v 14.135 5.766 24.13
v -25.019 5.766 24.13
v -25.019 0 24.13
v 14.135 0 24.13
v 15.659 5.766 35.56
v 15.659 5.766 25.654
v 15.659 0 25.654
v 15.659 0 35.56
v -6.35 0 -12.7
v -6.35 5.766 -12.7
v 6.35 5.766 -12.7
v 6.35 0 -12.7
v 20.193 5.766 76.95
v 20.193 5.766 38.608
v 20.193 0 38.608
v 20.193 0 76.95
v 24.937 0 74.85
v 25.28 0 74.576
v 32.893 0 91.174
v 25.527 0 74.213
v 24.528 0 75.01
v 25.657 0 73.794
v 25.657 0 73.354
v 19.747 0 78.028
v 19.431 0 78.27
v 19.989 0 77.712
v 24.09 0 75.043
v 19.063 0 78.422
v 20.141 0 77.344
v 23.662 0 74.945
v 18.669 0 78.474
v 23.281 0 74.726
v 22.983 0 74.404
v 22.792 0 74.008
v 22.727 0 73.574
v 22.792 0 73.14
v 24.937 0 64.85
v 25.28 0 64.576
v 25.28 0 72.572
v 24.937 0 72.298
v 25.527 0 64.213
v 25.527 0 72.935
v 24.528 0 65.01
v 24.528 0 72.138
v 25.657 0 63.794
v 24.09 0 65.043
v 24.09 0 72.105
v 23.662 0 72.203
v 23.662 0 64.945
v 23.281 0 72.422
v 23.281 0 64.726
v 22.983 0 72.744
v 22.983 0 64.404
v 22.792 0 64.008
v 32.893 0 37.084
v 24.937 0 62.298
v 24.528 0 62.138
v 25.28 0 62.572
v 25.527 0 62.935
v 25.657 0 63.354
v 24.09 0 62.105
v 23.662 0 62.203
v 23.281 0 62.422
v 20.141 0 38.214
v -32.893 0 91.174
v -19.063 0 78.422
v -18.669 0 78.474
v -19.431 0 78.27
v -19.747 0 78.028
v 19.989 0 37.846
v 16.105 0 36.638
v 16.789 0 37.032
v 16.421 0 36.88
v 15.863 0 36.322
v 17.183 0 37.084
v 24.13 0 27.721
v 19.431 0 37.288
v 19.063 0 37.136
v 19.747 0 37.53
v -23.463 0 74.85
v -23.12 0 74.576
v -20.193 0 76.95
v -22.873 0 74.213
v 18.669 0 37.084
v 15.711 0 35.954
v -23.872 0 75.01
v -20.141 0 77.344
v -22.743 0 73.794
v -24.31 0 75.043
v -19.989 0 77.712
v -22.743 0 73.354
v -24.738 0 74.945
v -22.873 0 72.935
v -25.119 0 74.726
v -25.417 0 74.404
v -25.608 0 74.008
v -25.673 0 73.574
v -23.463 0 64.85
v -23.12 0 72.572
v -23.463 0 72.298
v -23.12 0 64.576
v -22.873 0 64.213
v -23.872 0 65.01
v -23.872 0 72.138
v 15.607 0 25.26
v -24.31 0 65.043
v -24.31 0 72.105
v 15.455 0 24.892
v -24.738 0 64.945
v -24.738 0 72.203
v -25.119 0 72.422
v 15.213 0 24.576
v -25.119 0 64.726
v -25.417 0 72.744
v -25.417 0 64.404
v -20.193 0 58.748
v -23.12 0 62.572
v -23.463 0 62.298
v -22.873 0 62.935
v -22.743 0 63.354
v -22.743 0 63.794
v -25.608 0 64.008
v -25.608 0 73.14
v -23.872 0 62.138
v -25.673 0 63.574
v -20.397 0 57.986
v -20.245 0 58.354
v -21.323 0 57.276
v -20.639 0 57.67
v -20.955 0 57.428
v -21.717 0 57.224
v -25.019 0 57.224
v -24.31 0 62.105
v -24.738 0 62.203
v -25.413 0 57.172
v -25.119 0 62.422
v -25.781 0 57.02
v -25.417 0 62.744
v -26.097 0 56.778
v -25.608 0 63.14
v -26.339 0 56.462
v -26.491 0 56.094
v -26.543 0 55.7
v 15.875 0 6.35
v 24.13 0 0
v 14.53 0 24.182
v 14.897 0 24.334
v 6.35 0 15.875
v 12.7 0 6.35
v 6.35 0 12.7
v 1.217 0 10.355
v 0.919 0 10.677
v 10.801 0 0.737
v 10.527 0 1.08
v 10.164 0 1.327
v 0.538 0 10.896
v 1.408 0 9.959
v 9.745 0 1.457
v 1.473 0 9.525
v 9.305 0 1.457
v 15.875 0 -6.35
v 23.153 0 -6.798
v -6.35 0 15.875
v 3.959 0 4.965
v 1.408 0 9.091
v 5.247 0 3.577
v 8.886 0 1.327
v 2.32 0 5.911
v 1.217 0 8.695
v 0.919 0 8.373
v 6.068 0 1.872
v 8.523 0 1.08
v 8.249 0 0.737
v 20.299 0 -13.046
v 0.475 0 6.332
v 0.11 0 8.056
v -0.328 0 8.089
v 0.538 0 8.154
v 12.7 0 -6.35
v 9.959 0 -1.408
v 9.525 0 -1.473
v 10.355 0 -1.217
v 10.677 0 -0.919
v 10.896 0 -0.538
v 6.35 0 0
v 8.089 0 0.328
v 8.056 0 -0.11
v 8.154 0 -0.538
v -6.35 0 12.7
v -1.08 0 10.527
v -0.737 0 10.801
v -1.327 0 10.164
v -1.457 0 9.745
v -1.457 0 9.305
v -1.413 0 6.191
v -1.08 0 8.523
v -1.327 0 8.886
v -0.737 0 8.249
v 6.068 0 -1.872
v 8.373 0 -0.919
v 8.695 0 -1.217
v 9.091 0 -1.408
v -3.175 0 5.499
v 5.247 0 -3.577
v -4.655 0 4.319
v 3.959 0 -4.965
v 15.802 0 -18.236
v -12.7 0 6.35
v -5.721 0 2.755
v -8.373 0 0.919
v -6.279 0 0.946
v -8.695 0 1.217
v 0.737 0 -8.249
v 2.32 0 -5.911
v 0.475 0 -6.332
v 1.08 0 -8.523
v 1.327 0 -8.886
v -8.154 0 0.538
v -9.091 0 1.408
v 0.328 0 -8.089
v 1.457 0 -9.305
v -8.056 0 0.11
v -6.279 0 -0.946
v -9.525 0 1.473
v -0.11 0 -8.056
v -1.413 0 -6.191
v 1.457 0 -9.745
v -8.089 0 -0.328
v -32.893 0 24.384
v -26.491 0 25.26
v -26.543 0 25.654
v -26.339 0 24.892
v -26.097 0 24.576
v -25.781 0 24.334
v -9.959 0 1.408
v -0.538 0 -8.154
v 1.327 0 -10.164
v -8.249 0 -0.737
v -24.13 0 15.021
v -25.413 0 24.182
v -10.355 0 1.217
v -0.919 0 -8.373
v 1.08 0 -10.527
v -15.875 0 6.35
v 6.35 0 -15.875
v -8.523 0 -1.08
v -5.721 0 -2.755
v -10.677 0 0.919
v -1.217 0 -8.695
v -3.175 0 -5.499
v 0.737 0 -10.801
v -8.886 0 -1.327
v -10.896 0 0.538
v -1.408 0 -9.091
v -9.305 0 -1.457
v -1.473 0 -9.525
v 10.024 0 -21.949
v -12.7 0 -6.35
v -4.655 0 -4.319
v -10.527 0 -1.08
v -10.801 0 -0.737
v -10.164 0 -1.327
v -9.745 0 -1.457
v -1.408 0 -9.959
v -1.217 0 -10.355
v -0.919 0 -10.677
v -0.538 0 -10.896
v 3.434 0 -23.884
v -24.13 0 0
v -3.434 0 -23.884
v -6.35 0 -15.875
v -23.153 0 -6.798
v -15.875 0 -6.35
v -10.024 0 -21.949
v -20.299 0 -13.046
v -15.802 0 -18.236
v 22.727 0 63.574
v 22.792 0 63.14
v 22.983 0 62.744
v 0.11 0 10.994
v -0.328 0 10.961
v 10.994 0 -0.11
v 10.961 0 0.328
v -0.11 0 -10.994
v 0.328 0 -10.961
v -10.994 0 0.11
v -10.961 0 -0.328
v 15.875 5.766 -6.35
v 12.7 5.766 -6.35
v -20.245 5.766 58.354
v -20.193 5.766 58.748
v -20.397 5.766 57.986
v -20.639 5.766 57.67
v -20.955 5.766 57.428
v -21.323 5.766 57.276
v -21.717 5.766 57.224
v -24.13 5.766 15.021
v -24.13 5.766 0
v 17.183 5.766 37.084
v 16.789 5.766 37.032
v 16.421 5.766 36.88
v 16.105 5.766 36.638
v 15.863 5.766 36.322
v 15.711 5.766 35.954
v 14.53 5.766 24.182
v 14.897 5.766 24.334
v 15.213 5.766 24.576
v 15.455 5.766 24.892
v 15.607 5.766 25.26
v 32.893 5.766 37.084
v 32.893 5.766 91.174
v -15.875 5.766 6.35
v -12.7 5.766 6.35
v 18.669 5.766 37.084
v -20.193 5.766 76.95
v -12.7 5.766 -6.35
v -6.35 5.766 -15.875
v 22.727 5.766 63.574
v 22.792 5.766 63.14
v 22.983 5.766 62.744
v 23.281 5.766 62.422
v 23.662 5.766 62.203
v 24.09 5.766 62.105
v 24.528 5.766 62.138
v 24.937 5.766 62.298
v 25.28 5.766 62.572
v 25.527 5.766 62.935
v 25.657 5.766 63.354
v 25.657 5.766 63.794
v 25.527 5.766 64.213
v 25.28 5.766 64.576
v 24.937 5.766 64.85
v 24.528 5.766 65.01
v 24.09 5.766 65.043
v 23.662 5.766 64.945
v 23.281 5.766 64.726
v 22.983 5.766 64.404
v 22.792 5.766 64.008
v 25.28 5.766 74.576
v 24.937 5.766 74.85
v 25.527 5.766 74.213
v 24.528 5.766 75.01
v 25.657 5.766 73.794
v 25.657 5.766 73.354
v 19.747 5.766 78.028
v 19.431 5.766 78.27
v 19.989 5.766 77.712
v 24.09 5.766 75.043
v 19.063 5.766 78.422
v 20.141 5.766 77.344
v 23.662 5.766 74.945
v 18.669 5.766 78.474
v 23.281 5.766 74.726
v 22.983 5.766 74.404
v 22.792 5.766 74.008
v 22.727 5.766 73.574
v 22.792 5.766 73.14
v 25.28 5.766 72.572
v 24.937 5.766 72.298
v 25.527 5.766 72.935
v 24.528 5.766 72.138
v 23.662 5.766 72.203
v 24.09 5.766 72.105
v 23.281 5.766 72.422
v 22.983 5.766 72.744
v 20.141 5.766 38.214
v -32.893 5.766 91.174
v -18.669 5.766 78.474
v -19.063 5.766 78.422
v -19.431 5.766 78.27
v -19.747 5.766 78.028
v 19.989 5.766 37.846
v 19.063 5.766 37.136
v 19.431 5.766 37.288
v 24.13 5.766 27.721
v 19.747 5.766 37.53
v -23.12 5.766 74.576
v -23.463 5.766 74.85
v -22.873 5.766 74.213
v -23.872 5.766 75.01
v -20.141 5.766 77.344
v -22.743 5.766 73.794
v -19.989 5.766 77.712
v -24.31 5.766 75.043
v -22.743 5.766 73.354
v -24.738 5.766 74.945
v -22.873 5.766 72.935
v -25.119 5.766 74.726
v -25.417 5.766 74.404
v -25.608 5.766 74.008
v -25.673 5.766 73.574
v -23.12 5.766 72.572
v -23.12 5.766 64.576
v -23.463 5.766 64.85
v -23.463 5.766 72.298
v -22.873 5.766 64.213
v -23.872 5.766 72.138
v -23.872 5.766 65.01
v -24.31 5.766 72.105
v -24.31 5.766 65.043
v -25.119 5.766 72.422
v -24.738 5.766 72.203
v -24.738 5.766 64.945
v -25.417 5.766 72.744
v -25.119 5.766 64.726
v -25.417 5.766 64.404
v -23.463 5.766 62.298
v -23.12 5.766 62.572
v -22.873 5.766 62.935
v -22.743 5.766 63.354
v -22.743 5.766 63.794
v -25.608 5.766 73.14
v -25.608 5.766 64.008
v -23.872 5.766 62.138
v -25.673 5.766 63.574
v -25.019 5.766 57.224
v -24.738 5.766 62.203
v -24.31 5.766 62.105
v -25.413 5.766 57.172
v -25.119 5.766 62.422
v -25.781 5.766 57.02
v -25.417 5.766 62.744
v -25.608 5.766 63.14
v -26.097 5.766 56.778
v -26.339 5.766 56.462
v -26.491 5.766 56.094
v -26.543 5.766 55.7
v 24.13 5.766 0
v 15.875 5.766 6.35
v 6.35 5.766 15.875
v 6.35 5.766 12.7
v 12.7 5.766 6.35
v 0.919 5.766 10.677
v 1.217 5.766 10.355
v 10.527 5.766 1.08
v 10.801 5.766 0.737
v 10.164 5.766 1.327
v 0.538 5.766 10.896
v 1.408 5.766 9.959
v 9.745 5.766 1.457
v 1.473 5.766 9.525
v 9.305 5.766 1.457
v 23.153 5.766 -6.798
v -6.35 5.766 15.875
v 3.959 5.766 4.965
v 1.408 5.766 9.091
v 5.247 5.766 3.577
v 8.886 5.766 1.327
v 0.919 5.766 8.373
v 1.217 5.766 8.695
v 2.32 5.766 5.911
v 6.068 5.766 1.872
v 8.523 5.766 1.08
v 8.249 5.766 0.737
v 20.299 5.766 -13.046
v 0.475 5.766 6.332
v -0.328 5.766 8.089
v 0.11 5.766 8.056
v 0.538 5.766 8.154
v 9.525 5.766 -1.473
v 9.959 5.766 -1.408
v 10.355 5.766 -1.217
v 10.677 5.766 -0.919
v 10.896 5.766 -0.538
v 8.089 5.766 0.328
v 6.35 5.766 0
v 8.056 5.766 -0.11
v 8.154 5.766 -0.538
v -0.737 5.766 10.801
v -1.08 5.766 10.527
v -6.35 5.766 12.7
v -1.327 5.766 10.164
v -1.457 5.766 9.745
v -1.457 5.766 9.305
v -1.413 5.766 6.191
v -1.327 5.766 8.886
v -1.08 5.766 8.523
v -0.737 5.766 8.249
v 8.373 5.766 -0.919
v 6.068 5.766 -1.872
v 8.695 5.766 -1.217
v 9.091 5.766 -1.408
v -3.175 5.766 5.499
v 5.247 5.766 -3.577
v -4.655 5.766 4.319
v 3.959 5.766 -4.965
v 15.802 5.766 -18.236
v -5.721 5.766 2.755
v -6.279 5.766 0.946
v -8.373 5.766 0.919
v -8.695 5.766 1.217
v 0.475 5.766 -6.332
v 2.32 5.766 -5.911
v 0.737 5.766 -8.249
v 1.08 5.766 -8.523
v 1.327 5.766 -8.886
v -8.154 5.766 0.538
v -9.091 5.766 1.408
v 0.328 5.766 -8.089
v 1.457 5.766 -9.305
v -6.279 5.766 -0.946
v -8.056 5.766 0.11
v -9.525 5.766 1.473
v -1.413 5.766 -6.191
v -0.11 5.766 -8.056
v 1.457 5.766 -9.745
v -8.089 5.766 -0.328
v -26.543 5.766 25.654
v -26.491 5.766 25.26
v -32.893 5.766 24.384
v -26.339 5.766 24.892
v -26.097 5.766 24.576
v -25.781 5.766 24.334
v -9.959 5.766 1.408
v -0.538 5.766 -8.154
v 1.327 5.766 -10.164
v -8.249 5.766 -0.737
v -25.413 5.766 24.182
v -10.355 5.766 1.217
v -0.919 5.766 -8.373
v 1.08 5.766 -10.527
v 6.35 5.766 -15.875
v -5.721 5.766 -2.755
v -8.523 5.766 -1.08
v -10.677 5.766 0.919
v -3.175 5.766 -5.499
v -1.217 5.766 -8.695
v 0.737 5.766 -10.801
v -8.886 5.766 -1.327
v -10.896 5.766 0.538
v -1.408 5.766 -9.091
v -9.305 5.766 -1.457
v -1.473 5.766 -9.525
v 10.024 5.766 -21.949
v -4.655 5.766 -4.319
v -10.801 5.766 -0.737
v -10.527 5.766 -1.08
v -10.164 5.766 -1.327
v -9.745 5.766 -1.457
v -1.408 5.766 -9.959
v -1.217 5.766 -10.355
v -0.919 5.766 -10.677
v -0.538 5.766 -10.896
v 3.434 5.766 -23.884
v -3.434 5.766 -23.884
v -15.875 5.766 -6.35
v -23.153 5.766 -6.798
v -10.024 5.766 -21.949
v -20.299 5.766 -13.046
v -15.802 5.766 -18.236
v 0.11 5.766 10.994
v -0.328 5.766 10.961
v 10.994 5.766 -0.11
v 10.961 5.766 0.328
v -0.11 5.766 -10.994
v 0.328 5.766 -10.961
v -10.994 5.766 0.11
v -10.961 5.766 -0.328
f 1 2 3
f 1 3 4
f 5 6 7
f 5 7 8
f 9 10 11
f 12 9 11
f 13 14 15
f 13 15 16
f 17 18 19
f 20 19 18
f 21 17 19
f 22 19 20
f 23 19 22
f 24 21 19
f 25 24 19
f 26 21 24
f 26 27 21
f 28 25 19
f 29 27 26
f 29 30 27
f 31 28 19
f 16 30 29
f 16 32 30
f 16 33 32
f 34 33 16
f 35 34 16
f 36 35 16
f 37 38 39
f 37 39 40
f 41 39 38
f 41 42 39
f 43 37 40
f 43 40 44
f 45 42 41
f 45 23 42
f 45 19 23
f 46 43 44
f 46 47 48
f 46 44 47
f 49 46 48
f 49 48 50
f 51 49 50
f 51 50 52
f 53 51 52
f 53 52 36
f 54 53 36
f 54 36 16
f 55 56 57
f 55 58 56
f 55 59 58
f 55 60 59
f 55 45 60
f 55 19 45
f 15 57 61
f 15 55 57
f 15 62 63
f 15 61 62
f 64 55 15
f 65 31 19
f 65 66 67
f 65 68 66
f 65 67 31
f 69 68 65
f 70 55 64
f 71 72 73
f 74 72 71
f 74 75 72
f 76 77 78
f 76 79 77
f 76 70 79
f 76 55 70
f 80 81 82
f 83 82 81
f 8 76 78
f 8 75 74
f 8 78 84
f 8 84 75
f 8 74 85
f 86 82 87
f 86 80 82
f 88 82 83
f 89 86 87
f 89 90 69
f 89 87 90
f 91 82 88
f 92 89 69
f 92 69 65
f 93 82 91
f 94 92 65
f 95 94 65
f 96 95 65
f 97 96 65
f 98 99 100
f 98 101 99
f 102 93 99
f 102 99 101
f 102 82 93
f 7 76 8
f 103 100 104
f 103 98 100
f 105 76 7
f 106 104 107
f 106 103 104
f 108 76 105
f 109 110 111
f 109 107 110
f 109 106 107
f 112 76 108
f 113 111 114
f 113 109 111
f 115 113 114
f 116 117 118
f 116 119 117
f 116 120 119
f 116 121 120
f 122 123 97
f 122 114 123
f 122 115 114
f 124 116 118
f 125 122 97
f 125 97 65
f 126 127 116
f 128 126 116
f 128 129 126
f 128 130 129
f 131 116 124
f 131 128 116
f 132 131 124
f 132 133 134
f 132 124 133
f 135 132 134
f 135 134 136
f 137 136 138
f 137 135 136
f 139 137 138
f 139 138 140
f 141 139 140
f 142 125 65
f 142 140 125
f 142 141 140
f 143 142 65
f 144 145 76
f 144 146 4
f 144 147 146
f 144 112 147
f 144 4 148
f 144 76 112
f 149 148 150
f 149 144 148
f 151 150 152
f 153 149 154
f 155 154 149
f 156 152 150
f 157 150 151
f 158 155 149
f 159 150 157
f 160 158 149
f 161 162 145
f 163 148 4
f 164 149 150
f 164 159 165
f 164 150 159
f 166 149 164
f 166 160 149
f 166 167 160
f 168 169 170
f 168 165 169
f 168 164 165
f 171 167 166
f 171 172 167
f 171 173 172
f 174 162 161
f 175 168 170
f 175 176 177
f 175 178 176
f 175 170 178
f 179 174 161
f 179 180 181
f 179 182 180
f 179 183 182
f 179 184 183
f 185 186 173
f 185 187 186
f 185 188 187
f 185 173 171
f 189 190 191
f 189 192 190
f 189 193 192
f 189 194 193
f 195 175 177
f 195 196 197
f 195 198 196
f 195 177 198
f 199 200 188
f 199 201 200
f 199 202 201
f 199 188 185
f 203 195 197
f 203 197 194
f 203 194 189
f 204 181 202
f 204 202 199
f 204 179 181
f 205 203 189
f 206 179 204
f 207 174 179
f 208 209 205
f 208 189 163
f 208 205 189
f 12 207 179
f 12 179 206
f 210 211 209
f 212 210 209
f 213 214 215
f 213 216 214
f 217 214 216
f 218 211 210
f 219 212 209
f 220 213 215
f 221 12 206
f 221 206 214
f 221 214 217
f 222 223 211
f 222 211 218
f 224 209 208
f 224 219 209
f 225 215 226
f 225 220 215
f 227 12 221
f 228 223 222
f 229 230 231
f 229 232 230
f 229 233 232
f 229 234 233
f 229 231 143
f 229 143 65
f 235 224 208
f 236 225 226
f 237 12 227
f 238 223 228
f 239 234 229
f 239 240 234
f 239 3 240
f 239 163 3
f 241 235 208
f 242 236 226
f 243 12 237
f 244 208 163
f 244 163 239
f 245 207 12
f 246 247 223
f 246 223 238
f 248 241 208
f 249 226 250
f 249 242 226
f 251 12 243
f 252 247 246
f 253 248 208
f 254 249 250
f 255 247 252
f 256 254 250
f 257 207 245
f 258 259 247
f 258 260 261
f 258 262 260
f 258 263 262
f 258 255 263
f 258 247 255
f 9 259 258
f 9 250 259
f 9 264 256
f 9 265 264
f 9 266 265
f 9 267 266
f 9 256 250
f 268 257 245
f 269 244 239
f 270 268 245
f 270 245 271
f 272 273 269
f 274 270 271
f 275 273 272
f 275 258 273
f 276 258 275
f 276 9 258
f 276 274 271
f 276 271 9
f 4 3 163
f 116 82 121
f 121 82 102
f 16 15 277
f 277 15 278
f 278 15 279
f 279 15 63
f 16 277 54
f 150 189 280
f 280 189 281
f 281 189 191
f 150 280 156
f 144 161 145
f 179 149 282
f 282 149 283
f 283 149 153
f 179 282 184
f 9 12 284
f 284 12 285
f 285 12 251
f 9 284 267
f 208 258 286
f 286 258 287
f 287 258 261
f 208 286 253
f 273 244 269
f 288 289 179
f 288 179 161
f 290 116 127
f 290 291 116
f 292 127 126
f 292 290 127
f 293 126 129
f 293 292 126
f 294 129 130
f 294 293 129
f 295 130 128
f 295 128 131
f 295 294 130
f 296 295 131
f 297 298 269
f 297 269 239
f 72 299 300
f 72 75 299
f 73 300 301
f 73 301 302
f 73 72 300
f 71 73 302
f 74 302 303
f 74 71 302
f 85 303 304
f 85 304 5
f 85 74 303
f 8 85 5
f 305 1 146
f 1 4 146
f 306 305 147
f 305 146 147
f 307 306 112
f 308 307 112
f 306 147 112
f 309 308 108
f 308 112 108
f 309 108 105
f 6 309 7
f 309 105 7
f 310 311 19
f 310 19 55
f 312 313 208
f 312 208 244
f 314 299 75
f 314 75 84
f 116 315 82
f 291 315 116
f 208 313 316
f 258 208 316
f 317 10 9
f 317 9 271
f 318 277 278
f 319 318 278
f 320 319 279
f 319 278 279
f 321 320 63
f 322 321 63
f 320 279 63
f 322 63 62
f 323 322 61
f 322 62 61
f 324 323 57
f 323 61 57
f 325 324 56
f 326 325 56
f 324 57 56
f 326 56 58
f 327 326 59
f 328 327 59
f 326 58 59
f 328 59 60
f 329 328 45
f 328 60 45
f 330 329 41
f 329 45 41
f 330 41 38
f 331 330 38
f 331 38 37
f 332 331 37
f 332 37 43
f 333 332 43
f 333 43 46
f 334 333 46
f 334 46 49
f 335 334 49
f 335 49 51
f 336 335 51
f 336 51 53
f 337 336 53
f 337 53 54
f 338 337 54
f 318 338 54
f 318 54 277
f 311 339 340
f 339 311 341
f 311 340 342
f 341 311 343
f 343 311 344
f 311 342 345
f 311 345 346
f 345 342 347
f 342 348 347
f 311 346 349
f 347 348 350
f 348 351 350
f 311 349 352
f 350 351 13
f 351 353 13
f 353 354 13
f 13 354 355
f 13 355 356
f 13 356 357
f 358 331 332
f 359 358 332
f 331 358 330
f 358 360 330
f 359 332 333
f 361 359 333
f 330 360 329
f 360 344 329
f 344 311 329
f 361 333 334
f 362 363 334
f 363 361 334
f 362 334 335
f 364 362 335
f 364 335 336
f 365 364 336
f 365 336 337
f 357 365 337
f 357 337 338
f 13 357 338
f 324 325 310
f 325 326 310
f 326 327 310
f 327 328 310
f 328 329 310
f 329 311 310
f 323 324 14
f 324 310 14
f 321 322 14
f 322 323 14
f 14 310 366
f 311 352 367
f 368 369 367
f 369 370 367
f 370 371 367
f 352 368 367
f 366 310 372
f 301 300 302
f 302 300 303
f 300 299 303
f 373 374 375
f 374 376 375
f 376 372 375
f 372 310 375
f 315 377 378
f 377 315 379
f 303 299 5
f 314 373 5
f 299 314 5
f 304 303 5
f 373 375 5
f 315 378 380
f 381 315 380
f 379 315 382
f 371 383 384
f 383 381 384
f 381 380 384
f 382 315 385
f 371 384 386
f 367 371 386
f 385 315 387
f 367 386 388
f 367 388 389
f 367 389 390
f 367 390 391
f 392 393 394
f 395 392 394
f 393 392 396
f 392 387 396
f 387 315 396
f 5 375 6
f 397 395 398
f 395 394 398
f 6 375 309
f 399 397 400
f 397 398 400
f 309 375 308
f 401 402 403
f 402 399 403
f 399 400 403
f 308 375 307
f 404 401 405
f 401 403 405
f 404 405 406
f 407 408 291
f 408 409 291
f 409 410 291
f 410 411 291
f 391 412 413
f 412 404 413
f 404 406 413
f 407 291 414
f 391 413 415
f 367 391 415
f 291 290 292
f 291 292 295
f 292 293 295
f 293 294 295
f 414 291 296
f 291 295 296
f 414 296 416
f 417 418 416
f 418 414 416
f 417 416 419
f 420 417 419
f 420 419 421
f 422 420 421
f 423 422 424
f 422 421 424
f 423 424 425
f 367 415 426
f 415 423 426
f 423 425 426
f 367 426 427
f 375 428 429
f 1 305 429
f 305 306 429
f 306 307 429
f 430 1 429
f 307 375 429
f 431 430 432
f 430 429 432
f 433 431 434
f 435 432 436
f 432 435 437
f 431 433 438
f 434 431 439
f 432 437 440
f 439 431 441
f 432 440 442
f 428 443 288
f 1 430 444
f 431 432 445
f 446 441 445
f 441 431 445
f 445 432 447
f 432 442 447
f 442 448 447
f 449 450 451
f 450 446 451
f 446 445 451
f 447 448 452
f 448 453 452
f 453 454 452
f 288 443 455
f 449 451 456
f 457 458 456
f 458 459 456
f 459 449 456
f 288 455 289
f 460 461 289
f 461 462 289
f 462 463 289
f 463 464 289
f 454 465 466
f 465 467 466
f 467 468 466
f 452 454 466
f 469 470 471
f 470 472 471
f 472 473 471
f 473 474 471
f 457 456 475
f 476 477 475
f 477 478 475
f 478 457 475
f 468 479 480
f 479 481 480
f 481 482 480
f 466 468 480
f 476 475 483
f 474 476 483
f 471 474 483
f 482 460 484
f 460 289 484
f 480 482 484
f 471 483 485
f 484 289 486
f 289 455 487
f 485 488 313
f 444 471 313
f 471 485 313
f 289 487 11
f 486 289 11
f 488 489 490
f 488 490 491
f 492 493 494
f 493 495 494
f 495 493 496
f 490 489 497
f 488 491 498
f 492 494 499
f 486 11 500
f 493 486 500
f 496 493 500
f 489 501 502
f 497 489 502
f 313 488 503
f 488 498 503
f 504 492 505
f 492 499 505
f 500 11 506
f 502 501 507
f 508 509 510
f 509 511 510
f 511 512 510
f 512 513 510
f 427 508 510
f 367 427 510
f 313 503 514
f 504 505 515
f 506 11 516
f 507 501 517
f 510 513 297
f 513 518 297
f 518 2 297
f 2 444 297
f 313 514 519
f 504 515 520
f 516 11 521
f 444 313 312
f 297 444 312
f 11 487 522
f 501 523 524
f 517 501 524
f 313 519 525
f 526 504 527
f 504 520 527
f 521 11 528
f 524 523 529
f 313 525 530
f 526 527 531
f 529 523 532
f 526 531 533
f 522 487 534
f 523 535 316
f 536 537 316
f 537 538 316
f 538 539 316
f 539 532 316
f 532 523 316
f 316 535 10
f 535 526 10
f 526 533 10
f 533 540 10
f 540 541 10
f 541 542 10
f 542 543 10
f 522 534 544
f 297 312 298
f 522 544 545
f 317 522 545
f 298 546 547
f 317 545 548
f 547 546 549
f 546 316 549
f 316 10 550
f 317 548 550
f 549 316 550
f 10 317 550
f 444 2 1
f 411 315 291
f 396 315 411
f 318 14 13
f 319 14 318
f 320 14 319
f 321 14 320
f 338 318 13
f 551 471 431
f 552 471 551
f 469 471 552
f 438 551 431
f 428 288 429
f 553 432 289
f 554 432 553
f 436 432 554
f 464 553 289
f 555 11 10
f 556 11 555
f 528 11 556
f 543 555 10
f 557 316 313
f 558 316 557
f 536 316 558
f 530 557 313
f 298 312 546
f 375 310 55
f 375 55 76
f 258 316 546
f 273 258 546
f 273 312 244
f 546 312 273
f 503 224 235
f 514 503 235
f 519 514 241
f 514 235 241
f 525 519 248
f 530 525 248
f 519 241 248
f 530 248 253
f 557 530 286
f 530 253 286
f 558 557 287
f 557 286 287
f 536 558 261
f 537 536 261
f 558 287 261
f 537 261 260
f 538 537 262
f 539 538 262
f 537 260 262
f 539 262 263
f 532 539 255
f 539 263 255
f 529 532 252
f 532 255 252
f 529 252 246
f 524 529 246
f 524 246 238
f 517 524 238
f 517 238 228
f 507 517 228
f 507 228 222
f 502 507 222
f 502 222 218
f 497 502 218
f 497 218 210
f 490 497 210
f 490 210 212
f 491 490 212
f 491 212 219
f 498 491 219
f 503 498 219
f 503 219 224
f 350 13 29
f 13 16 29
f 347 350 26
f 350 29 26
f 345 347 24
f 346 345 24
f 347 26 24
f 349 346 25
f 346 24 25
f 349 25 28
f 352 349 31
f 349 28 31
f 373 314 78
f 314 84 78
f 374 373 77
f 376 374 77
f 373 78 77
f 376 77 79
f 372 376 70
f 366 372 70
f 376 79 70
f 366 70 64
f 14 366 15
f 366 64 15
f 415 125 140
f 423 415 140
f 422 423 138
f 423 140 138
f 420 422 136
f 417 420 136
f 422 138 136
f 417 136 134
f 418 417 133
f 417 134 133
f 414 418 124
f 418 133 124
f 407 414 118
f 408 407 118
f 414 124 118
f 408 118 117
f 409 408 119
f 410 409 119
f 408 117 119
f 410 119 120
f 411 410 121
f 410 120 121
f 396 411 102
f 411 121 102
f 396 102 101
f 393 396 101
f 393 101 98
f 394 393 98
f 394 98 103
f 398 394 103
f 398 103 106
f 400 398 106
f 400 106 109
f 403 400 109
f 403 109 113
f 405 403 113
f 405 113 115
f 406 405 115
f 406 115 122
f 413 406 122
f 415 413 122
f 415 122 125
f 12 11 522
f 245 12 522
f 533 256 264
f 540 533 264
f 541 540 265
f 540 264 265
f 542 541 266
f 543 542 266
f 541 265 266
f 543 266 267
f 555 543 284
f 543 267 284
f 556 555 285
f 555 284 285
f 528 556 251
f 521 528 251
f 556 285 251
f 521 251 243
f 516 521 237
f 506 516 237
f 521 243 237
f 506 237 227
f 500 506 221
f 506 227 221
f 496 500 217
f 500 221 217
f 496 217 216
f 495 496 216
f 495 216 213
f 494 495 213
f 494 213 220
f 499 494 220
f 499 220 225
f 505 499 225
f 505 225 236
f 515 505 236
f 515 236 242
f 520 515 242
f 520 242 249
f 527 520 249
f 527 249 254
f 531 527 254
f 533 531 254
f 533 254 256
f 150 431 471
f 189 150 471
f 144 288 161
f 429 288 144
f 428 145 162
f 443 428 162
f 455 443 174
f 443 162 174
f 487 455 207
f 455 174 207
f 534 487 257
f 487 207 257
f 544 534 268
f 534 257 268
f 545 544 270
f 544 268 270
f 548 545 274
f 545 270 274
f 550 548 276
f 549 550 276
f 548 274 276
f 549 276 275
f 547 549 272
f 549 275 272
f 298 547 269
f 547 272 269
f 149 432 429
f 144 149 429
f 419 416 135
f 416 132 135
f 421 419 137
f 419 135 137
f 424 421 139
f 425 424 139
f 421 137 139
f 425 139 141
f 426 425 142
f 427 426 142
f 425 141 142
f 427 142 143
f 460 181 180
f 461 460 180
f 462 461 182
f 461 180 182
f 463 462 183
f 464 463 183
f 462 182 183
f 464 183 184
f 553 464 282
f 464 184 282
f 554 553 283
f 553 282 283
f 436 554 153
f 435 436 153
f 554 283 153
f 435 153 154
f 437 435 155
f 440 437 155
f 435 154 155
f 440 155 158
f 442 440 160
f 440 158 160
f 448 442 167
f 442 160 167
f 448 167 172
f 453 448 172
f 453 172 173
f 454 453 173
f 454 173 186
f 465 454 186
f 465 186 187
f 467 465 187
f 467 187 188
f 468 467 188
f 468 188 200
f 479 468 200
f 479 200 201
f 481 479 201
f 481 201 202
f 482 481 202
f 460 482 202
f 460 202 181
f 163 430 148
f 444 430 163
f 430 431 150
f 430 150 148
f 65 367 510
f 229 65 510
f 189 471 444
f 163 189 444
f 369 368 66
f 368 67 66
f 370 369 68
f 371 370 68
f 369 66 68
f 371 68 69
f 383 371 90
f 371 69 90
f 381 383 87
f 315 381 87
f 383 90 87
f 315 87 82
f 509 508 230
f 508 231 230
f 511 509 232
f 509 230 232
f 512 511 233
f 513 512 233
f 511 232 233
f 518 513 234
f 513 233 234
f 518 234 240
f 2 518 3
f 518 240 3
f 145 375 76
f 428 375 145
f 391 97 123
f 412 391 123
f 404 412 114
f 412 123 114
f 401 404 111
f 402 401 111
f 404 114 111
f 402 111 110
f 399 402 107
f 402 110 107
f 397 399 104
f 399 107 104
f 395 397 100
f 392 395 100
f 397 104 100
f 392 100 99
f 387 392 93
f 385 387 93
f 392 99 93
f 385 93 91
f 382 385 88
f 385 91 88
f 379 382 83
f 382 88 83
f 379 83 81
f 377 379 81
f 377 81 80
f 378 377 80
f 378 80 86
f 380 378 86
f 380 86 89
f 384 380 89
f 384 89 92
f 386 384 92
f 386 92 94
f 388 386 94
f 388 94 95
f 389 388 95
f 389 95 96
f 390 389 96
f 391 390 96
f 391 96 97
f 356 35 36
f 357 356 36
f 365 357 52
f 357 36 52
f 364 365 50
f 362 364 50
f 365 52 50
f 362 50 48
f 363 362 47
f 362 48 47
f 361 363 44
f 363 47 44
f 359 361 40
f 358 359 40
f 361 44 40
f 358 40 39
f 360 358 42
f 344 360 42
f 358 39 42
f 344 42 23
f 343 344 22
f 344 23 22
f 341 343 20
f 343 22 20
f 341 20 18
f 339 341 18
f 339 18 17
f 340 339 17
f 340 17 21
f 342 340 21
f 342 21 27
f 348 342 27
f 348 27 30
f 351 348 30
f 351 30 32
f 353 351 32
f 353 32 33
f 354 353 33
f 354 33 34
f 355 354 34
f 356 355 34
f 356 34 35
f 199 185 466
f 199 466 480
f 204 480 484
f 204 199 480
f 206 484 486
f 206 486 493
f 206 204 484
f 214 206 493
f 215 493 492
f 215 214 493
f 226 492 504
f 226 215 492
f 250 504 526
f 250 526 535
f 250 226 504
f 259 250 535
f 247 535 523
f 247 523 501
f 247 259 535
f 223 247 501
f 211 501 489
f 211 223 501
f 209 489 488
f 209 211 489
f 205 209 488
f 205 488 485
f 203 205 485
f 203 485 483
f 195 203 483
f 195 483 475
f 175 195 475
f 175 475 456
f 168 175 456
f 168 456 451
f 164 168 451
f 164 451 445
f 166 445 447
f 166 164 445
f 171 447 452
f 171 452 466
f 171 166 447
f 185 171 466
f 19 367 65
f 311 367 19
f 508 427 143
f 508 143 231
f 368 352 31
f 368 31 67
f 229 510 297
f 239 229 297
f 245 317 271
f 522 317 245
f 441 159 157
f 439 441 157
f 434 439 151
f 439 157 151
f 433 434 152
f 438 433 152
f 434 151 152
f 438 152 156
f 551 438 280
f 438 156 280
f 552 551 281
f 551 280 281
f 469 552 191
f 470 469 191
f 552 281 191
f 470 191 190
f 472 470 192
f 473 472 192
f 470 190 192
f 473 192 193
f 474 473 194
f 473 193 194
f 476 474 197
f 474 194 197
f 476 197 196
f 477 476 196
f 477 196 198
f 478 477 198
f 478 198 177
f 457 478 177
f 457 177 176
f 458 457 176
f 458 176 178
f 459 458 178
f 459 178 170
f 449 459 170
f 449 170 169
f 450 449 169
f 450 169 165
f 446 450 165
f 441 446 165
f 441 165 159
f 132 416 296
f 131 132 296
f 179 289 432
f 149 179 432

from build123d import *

# Parameters (mm, degrees)
SKETCH2_R                 = 24.13
SKETCH2_R_2               = 6.35
BOSS_EXTRUDE1_DEPTH       = 5.7658
SKETCH10_W                = 12.7
SKETCH10_H                = 3.175
CUT_EXTRUDE2_DEPTH        = 5.7658
F_4_CLEARANCE_HOLE2_D     = 2.9464
F_4_CLEARANCE_HOLE2_DEPTH = 5.7668
CIRPATTERN2_COUNT         = 4
BOSS_EXTRUDE2_DEPTH       = 5.7658
BOSS_EXTRUDE4_DEPTH       = 5.7658
F_4_CLEARANCE_HOLE3_D     = 2.9464
F_4_CLEARANCE_HOLE3_DEPTH = 5.7658
BOSS_EXTRUDE3_DEPTH       = 5.7658
CUT_EXTRUDE4_REACH        = 7.766
SKETCH30_W                = 10.8839
SKETCH30_H                = 33.094
FILLET2_R                 = 1.524


with BuildPart() as part:
    # Sketch2 → Boss-Extrude1 (new body)
    with BuildSketch(Plane(origin=(0, 0, 0), x_dir=(1, 0, 0), z_dir=(0, 1, 0))):
        Circle(SKETCH2_R)
        Circle(SKETCH2_R_2, mode=Mode.SUBTRACT)
    extrude(amount=BOSS_EXTRUDE1_DEPTH)

    # Sketch10 → Cut-Extrude2 (cut)
    with BuildSketch(Plane(origin=(0, 5.7658, 0), x_dir=(1, 0, 0), z_dir=(0, 1, 0))):
        with Locations((0, 14.2875)):
            Rectangle(SKETCH10_W, SKETCH10_H)
    cut_extrude2 = extrude(amount=-CUT_EXTRUDE2_DEPTH, mode=Mode.SUBTRACT)

    # #4 Clearance Hole2
    with Locations(Plane(origin=(0, 5.7658, 0), x_dir=(1, 0, 0), z_dir=(0, 1, 0))):
        with Locations((0, 9.525)):
            f_4_clearance_hole2 = Hole(F_4_CLEARANCE_HOLE2_D / 2, depth=F_4_CLEARANCE_HOLE2_DEPTH)

    # CirPattern2: Cut-Extrude2, #4 Clearance Hole2 ×4 about axis
    cirpattern2_axis = Axis((0, 0, 0), (0, 1, 0))
    for i in range(1, CIRPATTERN2_COUNT):
        add(cut_extrude2.rotate(cirpattern2_axis, i * 360 / CIRPATTERN2_COUNT), mode=Mode.SUBTRACT)
        add(f_4_clearance_hole2.rotate(cirpattern2_axis, i * 360 / CIRPATTERN2_COUNT), mode=Mode.SUBTRACT)

    # Sketch16 → Boss-Extrude2 (add)
    with BuildSketch(Plane(origin=(0, 5.7658, 0), x_dir=(1, 0, 0), z_dir=(0, 1, 0))):
        with BuildLine():
            Line((-24.13, 0), (-24.13, -27.721453785))
            Line((-24.13, -27.721453785), (-32.893, -37.084))
            Line((-32.893, -37.084), (-32.893, -91.174))
            Line((-32.893, -91.174), (32.893, -91.174))
            Line((32.893, -91.174), (32.893, -37.084))
            Line((32.893, -37.084), (24.13, -27.721453785))
            Line((24.13, -27.721453785), (24.13, 0))
            ThreePointArc((24.13, 0), (21.910168678, -10.109471228), (15.6591, -18.358907571))
            Line((15.6591, -18.358907571), (15.6591, -37.084))
            Line((15.6591, -37.084), (20.193, -37.084))
            Line((20.193, -37.084), (20.193, -58.674))
            Line((20.193, -58.674), (20.193, -78.474))
            Line((20.193, -78.474), (-20.193, -78.474))
            Line((-20.193, -78.474), (-20.193, -58.674))
            Line((-20.193, -58.674), (-20.193, -37.084))
            Line((-20.193, -37.084), (-15.6591, -37.084))
            Line((-15.6591, -37.084), (-15.6591, -18.358907571))
            ThreePointArc((-15.6591, -18.358907571), (-21.910168678, -10.109471228), (-24.13, 0))
        make_face()
    extrude(amount=-BOSS_EXTRUDE2_DEPTH)

    # Sketch32 → Boss-Extrude4 (add)
    with BuildSketch(Plane(origin=(0, 5.7658, 0), x_dir=(1, 0, 0), z_dir=(0, 1, 0))):
        with BuildLine():
            ThreePointArc((15.6591, -18.358907571), (8.344353159, -22.64130452), (-6.7e-08, -24.13))
            Line((-6.7e-08, -24.13), (15.6591, -24.13))
            Line((15.6591, -24.13), (15.6591, -18.358907571))
        make_face()
        with BuildLine():
            Line((-15.6591, -18.358907571), (-15.6591, -24.13))
            Line((-15.6591, -24.13), (-6.7e-08, -24.13))
            ThreePointArc((-6.7e-08, -24.13), (-8.344353221, -22.641304497), (-15.6591, -18.358907571))
        make_face()
    extrude(amount=-BOSS_EXTRUDE4_DEPTH)

    # #4 Clearance Hole3
    with Locations(Plane(origin=(0, 5.7658, 0), x_dir=(1, 0, 0), z_dir=(0, 1, 0))):
        with Locations((-24.2, -63.574), (-24.2, -73.574), (24.2, -63.574), (24.2, -73.574)):
            Hole(F_4_CLEARANCE_HOLE3_D / 2, depth=F_4_CLEARANCE_HOLE3_DEPTH)

    # Sketch31 → Boss-Extrude3 (add)
    with BuildSketch(Plane(origin=(0, 5.7658, 0), x_dir=(1, 0, 0), z_dir=(0, 1, 0))):
        Polygon((-32.893, -37.084), (-32.893, -24.384), (-24.13, -15.021453785), (-24.13, -27.721453785), align=None)
    extrude(amount=-BOSS_EXTRUDE3_DEPTH)

    # Sketch30 → Cut-Extrude4 (cut, up to next)
    with BuildSketch(Plane(origin=(0, 5.7658, 0), x_dir=(1, 0, 0), z_dir=(0, 1, 0)), mode=Mode.PRIVATE) as cut_extrude4_sk1:
        with Locations((-21.10105, -40.677)):
            Rectangle(SKETCH30_W, SKETCH30_H)
    cut_extrude4_tool1 = extrude(cut_extrude4_sk1.sketch, amount=-CUT_EXTRUDE4_REACH, mode=Mode.PRIVATE) & part.part
    add(cut_extrude4_tool1.solids().sort_by_distance((-21.10105, 5.7658, 40.677))[0], mode=Mode.SUBTRACT)

    # Fillet2
    fillet2_edges = [part.edges().sort_by_distance(p)[0] for p in [
        (15.6591, 2.8829, 24.13),
        (-26.543, 2.8829, 57.224),
        (-26.543, 2.8829, 24.13),
        (-20.193, 2.8829, 57.224),
        (-20.193, 2.8829, 78.474),
        (20.193, 2.8829, 78.474),
        (20.193, 2.8829, 37.084),
        (15.6591, 2.8829, 37.084),
    ]]
    fillet(fillet2_edges, radius=FILLET2_R)


solid = part.part
